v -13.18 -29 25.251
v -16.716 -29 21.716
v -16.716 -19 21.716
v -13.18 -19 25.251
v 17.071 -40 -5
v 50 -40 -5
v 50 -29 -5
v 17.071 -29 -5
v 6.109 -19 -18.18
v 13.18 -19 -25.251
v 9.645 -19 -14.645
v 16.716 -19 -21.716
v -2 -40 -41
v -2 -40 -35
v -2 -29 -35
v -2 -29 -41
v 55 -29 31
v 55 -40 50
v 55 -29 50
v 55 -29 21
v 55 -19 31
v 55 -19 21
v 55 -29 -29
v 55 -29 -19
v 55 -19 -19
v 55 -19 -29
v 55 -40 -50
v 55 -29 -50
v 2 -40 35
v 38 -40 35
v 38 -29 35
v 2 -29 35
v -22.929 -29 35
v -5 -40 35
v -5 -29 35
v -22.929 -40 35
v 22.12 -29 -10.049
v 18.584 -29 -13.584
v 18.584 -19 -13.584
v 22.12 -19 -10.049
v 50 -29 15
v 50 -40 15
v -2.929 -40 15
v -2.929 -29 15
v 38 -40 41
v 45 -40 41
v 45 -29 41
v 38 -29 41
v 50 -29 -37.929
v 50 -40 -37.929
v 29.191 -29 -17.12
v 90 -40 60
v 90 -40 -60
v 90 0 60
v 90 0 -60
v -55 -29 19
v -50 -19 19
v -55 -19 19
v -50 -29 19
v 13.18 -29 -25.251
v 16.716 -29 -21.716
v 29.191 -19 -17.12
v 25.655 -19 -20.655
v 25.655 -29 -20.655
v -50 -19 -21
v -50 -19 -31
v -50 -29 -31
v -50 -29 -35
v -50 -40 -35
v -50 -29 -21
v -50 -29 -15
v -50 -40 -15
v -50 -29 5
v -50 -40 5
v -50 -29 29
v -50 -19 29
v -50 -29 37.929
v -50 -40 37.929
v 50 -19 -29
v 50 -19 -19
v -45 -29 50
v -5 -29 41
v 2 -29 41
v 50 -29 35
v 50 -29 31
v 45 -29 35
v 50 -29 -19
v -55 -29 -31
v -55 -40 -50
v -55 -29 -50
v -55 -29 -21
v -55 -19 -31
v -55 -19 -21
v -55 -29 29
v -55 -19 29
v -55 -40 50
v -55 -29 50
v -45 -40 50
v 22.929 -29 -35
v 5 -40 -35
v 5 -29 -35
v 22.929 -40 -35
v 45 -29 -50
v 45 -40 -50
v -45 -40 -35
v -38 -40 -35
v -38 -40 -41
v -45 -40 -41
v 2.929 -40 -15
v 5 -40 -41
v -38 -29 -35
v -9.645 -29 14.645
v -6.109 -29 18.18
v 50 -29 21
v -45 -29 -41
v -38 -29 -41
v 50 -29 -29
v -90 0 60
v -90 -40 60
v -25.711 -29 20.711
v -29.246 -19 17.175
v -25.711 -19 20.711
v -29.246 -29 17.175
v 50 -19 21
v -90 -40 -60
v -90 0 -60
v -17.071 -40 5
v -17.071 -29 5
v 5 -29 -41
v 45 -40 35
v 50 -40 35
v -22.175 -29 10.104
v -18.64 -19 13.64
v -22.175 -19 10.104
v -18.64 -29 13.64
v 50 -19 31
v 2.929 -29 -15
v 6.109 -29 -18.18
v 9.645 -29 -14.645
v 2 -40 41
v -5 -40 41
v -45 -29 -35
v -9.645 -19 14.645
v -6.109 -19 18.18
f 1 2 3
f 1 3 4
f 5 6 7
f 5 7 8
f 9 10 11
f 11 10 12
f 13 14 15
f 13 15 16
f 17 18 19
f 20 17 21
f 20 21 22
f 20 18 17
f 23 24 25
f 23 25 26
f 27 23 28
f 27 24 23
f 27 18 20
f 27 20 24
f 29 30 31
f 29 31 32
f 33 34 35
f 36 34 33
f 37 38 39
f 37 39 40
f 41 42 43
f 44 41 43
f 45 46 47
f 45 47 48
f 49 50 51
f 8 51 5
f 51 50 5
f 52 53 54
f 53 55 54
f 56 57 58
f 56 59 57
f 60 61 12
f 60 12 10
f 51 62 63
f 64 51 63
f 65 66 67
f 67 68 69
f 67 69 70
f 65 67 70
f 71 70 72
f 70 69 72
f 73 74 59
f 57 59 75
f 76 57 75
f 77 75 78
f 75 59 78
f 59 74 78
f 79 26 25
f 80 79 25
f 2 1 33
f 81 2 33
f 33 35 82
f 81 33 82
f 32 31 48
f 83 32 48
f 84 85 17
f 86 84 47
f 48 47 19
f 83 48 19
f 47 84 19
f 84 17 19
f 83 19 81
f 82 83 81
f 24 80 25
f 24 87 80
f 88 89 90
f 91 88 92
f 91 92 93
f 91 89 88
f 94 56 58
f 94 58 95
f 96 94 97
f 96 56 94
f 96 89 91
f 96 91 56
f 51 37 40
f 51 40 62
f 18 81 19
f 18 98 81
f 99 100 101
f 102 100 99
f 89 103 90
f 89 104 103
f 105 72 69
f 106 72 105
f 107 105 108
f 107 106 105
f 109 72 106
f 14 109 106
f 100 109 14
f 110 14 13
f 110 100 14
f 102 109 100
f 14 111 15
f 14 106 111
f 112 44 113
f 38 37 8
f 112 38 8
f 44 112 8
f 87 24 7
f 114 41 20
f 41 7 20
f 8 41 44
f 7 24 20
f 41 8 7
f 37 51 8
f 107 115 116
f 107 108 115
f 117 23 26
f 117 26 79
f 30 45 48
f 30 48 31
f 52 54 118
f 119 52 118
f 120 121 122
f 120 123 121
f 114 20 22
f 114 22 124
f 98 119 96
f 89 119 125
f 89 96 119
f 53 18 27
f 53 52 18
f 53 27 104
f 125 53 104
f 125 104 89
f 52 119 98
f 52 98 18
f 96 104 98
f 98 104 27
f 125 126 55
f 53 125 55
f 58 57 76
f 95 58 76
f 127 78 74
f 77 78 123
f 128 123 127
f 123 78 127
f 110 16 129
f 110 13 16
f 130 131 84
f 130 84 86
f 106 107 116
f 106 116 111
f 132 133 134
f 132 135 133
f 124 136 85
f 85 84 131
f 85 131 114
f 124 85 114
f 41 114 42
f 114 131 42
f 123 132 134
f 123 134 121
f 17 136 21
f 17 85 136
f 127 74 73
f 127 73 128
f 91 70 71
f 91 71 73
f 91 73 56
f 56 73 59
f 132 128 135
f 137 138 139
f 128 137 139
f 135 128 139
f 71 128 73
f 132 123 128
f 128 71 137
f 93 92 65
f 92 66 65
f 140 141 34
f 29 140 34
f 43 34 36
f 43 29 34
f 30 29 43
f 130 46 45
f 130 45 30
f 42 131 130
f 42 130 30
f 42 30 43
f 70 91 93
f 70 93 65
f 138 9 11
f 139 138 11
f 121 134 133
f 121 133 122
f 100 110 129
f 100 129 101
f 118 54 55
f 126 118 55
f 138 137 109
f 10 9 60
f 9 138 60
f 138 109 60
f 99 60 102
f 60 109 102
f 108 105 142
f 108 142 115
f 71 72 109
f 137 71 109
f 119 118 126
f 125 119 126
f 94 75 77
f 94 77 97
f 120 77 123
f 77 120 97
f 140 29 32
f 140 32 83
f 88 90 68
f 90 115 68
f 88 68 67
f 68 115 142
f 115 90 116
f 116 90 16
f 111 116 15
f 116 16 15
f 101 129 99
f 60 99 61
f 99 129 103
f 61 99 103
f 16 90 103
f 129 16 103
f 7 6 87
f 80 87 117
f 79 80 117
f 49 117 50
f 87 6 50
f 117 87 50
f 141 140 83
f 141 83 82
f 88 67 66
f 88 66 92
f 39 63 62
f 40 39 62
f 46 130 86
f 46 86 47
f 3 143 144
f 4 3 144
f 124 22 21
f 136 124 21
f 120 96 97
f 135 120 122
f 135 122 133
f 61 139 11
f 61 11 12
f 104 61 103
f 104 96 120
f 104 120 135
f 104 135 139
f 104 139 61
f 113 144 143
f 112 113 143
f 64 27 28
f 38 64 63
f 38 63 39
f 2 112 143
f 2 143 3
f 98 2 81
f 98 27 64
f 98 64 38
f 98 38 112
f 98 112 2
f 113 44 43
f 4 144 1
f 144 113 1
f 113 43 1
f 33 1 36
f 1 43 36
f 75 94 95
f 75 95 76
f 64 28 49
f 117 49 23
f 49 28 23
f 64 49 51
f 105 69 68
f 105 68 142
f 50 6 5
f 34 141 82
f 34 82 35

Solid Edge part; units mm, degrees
sketch "Sketch1" plane through (0, 0, 0) normal (0, -1, 0) x (1, 0, 0)
  line L0 (90, -60) -> (90, 60)
  line L1 (90, 60) -> (-90, 60)
  line L2 (-90, 60) -> (-90, -60)
  line L3 (-90, -60) -> (90, -60)
extrude "Protrusion1" add sketch "Sketch1" along normal blind 40
sketch "Sketch2" plane through (0, -40, 0) normal (0, -1, 0) x (1, 0, 0)
  line L0 (-55, 50) -> (45, -50)
  line L1 (45, -50) -> (-55, -50)
  line L2 (-55, -50) -> (-55, 50)
  line L3 (-50, 37.9289) -> (-17.0711, 5)
  line L4 (-50, 5) -> (-17.0711, 5)
  line L5 (-50, 5) -> (-50, 37.9289)
  line L6 (-50, -15) -> (2.9289, -15)
  line L7 (2.9289, -15) -> (22.9289, -35)
  line L8 (5, -35) -> (22.9289, -35)
  line L9 (5, -41) -> (5, -35)
  line L10 (-2, -41) -> (5, -41)
  line L11 (-2, -35) -> (-2, -41)
  line L12 (-38, -35) -> (-2, -35)
  line L13 (-38, -41) -> (-38, -35)
  line L14 (-45, -41) -> (-38, -41)
  line L15 (-45, -35) -> (-45, -41)
  line L16 (-50, -35) -> (-45, -35)
  line L17 (-50, -35) -> (-50, -15)
  line L18 (55, -50) -> (-45, 50)
  line L19 (-45, 50) -> (55, 50)
  line L20 (55, 50) -> (55, -50)
  line L21 (-2.9289, 15) -> (-22.9289, 35)
  line L22 (-5, 35) -> (-22.9289, 35)
  line L23 (-5, 41) -> (-5, 35)
  line L24 (2, 41) -> (-5, 41)
  line L25 (2, 35) -> (2, 41)
  line L26 (38, 35) -> (2, 35)
  line L27 (38, 41) -> (38, 35)
  line L28 (45, 41) -> (38, 41)
  line L29 (45, 35) -> (45, 41)
  line L30 (50, 35) -> (45, 35)
  line L31 (50, 35) -> (50, 15)
  line L32 (50, 15) -> (-2.9289, 15)
  line L33 (50, -5) -> (17.0711, -5)
  line L34 (50, -37.9289) -> (17.0711, -5)
  line L35 (50, -5) -> (50, -37.9289)
  dimension "D1" = 100
  dimension "D2" = 15
  dimension "D3" = 6
  dimension "D4" = 10
  dimension "D5" = 7
  dimension "D6" = 20
  dimension "D7" = 20
  dimension "D8" = 5
  dimension "D9" = 6
  dimension "D10" = 7
  dimension "D11" = 40
  dimension "D12" = 100
  dimension "D13" = 15
  dimension "D14" = 6
  dimension "D15" = 10
  dimension "D16" = 7
  dimension "D17" = 20
  dimension "D18" = 20
  dimension "D19" = 5
  dimension "D20" = 6
  dimension "D21" = 7
  dimension "D22" = 40
  dimension "D23" = 35
  dimension "D24" = 10
  dimension "D25" = 35
  dimension "D26" = 10
extrude "VaciadoExtruido_1" cut sketch "Sketch2" against normal blind 11
sketch "Sketch3" plane through (-20, -29, 5) normal (0, -1, 0) x (1, 0, 0)
  line L0 (-35, 24) -> (-30, 24)
  line L1 (-30, 24) -> (-30, 14)
  line L2 (-30, 14) -> (-35, 14)
  line L3 (-35, 14) -> (-35, 24)
  line L4 (1.3604, 8.6396) -> (-2.1751, 5.1041)
  line L5 (-2.1751, 5.1041) -> (-9.2462, 12.1751)
  line L6 (-9.2462, 12.1751) -> (-5.7107, 15.7107)
  line L7 (-5.7107, 15.7107) -> (1.3604, 8.6396)
  line L8 (-35, -26) -> (-30, -26)
  line L9 (-30, -26) -> (-30, -36)
  line L10 (-30, -36) -> (-35, -36)
  line L11 (-35, -36) -> (-35, -26)
  line L12 (36.7157, -26.7157) -> (33.1802, -30.2513)
  line L13 (33.1802, -30.2513) -> (26.1091, -23.1802)
  line L14 (26.1091, -23.1802) -> (29.6447, -19.6447)
  line L15 (29.6447, -19.6447) -> (36.7157, -26.7157)
  line L16 (3.2843, 16.7157) -> (6.8198, 20.2513)
  line L17 (6.8198, 20.2513) -> (13.8909, 13.1802)
  line L18 (13.8909, 13.1802) -> (10.3553, 9.6447)
  line L19 (10.3553, 9.6447) -> (3.2843, 16.7157)
  line L20 (38.5843, -18.5843) -> (42.1198, -15.0488)
  line L21 (42.1198, -15.0488) -> (49.1909, -22.1198)
  line L22 (49.1909, -22.1198) -> (45.6554, -25.6554)
  line L23 (45.6554, -25.6554) -> (38.5843, -18.5843)
  line L24 (70, -24) -> (75, -24)
  line L25 (75, -24) -> (75, -34)
  line L26 (75, -34) -> (70, -34)
  line L27 (70, -34) -> (70, -24)
  line L28 (70, 26) -> (75, 26)
  line L29 (75, 26) -> (75, 16)
  line L30 (75, 16) -> (70, 16)
  line L31 (70, 16) -> (70, 26)
  dimension "D1" = 10
  dimension "D2" = 10
  dimension "D3" = 10
  dimension "D4" = 10
  dimension "D5" = 10
  dimension "D6" = 10
  dimension "D7" = 10
  dimension "D8" = 10
  dimension "D9" = 40
  dimension "D10" = 19
  dimension "D11" = 40
  dimension "D12" = 40
  dimension "D13" = 40
  dimension "D14" = 40
  dimension "D15" = 19
  dimension "D16" = 40
extrude "VaciadoExtruido_2" cut sketch "Sketch3" against normal blind 10
